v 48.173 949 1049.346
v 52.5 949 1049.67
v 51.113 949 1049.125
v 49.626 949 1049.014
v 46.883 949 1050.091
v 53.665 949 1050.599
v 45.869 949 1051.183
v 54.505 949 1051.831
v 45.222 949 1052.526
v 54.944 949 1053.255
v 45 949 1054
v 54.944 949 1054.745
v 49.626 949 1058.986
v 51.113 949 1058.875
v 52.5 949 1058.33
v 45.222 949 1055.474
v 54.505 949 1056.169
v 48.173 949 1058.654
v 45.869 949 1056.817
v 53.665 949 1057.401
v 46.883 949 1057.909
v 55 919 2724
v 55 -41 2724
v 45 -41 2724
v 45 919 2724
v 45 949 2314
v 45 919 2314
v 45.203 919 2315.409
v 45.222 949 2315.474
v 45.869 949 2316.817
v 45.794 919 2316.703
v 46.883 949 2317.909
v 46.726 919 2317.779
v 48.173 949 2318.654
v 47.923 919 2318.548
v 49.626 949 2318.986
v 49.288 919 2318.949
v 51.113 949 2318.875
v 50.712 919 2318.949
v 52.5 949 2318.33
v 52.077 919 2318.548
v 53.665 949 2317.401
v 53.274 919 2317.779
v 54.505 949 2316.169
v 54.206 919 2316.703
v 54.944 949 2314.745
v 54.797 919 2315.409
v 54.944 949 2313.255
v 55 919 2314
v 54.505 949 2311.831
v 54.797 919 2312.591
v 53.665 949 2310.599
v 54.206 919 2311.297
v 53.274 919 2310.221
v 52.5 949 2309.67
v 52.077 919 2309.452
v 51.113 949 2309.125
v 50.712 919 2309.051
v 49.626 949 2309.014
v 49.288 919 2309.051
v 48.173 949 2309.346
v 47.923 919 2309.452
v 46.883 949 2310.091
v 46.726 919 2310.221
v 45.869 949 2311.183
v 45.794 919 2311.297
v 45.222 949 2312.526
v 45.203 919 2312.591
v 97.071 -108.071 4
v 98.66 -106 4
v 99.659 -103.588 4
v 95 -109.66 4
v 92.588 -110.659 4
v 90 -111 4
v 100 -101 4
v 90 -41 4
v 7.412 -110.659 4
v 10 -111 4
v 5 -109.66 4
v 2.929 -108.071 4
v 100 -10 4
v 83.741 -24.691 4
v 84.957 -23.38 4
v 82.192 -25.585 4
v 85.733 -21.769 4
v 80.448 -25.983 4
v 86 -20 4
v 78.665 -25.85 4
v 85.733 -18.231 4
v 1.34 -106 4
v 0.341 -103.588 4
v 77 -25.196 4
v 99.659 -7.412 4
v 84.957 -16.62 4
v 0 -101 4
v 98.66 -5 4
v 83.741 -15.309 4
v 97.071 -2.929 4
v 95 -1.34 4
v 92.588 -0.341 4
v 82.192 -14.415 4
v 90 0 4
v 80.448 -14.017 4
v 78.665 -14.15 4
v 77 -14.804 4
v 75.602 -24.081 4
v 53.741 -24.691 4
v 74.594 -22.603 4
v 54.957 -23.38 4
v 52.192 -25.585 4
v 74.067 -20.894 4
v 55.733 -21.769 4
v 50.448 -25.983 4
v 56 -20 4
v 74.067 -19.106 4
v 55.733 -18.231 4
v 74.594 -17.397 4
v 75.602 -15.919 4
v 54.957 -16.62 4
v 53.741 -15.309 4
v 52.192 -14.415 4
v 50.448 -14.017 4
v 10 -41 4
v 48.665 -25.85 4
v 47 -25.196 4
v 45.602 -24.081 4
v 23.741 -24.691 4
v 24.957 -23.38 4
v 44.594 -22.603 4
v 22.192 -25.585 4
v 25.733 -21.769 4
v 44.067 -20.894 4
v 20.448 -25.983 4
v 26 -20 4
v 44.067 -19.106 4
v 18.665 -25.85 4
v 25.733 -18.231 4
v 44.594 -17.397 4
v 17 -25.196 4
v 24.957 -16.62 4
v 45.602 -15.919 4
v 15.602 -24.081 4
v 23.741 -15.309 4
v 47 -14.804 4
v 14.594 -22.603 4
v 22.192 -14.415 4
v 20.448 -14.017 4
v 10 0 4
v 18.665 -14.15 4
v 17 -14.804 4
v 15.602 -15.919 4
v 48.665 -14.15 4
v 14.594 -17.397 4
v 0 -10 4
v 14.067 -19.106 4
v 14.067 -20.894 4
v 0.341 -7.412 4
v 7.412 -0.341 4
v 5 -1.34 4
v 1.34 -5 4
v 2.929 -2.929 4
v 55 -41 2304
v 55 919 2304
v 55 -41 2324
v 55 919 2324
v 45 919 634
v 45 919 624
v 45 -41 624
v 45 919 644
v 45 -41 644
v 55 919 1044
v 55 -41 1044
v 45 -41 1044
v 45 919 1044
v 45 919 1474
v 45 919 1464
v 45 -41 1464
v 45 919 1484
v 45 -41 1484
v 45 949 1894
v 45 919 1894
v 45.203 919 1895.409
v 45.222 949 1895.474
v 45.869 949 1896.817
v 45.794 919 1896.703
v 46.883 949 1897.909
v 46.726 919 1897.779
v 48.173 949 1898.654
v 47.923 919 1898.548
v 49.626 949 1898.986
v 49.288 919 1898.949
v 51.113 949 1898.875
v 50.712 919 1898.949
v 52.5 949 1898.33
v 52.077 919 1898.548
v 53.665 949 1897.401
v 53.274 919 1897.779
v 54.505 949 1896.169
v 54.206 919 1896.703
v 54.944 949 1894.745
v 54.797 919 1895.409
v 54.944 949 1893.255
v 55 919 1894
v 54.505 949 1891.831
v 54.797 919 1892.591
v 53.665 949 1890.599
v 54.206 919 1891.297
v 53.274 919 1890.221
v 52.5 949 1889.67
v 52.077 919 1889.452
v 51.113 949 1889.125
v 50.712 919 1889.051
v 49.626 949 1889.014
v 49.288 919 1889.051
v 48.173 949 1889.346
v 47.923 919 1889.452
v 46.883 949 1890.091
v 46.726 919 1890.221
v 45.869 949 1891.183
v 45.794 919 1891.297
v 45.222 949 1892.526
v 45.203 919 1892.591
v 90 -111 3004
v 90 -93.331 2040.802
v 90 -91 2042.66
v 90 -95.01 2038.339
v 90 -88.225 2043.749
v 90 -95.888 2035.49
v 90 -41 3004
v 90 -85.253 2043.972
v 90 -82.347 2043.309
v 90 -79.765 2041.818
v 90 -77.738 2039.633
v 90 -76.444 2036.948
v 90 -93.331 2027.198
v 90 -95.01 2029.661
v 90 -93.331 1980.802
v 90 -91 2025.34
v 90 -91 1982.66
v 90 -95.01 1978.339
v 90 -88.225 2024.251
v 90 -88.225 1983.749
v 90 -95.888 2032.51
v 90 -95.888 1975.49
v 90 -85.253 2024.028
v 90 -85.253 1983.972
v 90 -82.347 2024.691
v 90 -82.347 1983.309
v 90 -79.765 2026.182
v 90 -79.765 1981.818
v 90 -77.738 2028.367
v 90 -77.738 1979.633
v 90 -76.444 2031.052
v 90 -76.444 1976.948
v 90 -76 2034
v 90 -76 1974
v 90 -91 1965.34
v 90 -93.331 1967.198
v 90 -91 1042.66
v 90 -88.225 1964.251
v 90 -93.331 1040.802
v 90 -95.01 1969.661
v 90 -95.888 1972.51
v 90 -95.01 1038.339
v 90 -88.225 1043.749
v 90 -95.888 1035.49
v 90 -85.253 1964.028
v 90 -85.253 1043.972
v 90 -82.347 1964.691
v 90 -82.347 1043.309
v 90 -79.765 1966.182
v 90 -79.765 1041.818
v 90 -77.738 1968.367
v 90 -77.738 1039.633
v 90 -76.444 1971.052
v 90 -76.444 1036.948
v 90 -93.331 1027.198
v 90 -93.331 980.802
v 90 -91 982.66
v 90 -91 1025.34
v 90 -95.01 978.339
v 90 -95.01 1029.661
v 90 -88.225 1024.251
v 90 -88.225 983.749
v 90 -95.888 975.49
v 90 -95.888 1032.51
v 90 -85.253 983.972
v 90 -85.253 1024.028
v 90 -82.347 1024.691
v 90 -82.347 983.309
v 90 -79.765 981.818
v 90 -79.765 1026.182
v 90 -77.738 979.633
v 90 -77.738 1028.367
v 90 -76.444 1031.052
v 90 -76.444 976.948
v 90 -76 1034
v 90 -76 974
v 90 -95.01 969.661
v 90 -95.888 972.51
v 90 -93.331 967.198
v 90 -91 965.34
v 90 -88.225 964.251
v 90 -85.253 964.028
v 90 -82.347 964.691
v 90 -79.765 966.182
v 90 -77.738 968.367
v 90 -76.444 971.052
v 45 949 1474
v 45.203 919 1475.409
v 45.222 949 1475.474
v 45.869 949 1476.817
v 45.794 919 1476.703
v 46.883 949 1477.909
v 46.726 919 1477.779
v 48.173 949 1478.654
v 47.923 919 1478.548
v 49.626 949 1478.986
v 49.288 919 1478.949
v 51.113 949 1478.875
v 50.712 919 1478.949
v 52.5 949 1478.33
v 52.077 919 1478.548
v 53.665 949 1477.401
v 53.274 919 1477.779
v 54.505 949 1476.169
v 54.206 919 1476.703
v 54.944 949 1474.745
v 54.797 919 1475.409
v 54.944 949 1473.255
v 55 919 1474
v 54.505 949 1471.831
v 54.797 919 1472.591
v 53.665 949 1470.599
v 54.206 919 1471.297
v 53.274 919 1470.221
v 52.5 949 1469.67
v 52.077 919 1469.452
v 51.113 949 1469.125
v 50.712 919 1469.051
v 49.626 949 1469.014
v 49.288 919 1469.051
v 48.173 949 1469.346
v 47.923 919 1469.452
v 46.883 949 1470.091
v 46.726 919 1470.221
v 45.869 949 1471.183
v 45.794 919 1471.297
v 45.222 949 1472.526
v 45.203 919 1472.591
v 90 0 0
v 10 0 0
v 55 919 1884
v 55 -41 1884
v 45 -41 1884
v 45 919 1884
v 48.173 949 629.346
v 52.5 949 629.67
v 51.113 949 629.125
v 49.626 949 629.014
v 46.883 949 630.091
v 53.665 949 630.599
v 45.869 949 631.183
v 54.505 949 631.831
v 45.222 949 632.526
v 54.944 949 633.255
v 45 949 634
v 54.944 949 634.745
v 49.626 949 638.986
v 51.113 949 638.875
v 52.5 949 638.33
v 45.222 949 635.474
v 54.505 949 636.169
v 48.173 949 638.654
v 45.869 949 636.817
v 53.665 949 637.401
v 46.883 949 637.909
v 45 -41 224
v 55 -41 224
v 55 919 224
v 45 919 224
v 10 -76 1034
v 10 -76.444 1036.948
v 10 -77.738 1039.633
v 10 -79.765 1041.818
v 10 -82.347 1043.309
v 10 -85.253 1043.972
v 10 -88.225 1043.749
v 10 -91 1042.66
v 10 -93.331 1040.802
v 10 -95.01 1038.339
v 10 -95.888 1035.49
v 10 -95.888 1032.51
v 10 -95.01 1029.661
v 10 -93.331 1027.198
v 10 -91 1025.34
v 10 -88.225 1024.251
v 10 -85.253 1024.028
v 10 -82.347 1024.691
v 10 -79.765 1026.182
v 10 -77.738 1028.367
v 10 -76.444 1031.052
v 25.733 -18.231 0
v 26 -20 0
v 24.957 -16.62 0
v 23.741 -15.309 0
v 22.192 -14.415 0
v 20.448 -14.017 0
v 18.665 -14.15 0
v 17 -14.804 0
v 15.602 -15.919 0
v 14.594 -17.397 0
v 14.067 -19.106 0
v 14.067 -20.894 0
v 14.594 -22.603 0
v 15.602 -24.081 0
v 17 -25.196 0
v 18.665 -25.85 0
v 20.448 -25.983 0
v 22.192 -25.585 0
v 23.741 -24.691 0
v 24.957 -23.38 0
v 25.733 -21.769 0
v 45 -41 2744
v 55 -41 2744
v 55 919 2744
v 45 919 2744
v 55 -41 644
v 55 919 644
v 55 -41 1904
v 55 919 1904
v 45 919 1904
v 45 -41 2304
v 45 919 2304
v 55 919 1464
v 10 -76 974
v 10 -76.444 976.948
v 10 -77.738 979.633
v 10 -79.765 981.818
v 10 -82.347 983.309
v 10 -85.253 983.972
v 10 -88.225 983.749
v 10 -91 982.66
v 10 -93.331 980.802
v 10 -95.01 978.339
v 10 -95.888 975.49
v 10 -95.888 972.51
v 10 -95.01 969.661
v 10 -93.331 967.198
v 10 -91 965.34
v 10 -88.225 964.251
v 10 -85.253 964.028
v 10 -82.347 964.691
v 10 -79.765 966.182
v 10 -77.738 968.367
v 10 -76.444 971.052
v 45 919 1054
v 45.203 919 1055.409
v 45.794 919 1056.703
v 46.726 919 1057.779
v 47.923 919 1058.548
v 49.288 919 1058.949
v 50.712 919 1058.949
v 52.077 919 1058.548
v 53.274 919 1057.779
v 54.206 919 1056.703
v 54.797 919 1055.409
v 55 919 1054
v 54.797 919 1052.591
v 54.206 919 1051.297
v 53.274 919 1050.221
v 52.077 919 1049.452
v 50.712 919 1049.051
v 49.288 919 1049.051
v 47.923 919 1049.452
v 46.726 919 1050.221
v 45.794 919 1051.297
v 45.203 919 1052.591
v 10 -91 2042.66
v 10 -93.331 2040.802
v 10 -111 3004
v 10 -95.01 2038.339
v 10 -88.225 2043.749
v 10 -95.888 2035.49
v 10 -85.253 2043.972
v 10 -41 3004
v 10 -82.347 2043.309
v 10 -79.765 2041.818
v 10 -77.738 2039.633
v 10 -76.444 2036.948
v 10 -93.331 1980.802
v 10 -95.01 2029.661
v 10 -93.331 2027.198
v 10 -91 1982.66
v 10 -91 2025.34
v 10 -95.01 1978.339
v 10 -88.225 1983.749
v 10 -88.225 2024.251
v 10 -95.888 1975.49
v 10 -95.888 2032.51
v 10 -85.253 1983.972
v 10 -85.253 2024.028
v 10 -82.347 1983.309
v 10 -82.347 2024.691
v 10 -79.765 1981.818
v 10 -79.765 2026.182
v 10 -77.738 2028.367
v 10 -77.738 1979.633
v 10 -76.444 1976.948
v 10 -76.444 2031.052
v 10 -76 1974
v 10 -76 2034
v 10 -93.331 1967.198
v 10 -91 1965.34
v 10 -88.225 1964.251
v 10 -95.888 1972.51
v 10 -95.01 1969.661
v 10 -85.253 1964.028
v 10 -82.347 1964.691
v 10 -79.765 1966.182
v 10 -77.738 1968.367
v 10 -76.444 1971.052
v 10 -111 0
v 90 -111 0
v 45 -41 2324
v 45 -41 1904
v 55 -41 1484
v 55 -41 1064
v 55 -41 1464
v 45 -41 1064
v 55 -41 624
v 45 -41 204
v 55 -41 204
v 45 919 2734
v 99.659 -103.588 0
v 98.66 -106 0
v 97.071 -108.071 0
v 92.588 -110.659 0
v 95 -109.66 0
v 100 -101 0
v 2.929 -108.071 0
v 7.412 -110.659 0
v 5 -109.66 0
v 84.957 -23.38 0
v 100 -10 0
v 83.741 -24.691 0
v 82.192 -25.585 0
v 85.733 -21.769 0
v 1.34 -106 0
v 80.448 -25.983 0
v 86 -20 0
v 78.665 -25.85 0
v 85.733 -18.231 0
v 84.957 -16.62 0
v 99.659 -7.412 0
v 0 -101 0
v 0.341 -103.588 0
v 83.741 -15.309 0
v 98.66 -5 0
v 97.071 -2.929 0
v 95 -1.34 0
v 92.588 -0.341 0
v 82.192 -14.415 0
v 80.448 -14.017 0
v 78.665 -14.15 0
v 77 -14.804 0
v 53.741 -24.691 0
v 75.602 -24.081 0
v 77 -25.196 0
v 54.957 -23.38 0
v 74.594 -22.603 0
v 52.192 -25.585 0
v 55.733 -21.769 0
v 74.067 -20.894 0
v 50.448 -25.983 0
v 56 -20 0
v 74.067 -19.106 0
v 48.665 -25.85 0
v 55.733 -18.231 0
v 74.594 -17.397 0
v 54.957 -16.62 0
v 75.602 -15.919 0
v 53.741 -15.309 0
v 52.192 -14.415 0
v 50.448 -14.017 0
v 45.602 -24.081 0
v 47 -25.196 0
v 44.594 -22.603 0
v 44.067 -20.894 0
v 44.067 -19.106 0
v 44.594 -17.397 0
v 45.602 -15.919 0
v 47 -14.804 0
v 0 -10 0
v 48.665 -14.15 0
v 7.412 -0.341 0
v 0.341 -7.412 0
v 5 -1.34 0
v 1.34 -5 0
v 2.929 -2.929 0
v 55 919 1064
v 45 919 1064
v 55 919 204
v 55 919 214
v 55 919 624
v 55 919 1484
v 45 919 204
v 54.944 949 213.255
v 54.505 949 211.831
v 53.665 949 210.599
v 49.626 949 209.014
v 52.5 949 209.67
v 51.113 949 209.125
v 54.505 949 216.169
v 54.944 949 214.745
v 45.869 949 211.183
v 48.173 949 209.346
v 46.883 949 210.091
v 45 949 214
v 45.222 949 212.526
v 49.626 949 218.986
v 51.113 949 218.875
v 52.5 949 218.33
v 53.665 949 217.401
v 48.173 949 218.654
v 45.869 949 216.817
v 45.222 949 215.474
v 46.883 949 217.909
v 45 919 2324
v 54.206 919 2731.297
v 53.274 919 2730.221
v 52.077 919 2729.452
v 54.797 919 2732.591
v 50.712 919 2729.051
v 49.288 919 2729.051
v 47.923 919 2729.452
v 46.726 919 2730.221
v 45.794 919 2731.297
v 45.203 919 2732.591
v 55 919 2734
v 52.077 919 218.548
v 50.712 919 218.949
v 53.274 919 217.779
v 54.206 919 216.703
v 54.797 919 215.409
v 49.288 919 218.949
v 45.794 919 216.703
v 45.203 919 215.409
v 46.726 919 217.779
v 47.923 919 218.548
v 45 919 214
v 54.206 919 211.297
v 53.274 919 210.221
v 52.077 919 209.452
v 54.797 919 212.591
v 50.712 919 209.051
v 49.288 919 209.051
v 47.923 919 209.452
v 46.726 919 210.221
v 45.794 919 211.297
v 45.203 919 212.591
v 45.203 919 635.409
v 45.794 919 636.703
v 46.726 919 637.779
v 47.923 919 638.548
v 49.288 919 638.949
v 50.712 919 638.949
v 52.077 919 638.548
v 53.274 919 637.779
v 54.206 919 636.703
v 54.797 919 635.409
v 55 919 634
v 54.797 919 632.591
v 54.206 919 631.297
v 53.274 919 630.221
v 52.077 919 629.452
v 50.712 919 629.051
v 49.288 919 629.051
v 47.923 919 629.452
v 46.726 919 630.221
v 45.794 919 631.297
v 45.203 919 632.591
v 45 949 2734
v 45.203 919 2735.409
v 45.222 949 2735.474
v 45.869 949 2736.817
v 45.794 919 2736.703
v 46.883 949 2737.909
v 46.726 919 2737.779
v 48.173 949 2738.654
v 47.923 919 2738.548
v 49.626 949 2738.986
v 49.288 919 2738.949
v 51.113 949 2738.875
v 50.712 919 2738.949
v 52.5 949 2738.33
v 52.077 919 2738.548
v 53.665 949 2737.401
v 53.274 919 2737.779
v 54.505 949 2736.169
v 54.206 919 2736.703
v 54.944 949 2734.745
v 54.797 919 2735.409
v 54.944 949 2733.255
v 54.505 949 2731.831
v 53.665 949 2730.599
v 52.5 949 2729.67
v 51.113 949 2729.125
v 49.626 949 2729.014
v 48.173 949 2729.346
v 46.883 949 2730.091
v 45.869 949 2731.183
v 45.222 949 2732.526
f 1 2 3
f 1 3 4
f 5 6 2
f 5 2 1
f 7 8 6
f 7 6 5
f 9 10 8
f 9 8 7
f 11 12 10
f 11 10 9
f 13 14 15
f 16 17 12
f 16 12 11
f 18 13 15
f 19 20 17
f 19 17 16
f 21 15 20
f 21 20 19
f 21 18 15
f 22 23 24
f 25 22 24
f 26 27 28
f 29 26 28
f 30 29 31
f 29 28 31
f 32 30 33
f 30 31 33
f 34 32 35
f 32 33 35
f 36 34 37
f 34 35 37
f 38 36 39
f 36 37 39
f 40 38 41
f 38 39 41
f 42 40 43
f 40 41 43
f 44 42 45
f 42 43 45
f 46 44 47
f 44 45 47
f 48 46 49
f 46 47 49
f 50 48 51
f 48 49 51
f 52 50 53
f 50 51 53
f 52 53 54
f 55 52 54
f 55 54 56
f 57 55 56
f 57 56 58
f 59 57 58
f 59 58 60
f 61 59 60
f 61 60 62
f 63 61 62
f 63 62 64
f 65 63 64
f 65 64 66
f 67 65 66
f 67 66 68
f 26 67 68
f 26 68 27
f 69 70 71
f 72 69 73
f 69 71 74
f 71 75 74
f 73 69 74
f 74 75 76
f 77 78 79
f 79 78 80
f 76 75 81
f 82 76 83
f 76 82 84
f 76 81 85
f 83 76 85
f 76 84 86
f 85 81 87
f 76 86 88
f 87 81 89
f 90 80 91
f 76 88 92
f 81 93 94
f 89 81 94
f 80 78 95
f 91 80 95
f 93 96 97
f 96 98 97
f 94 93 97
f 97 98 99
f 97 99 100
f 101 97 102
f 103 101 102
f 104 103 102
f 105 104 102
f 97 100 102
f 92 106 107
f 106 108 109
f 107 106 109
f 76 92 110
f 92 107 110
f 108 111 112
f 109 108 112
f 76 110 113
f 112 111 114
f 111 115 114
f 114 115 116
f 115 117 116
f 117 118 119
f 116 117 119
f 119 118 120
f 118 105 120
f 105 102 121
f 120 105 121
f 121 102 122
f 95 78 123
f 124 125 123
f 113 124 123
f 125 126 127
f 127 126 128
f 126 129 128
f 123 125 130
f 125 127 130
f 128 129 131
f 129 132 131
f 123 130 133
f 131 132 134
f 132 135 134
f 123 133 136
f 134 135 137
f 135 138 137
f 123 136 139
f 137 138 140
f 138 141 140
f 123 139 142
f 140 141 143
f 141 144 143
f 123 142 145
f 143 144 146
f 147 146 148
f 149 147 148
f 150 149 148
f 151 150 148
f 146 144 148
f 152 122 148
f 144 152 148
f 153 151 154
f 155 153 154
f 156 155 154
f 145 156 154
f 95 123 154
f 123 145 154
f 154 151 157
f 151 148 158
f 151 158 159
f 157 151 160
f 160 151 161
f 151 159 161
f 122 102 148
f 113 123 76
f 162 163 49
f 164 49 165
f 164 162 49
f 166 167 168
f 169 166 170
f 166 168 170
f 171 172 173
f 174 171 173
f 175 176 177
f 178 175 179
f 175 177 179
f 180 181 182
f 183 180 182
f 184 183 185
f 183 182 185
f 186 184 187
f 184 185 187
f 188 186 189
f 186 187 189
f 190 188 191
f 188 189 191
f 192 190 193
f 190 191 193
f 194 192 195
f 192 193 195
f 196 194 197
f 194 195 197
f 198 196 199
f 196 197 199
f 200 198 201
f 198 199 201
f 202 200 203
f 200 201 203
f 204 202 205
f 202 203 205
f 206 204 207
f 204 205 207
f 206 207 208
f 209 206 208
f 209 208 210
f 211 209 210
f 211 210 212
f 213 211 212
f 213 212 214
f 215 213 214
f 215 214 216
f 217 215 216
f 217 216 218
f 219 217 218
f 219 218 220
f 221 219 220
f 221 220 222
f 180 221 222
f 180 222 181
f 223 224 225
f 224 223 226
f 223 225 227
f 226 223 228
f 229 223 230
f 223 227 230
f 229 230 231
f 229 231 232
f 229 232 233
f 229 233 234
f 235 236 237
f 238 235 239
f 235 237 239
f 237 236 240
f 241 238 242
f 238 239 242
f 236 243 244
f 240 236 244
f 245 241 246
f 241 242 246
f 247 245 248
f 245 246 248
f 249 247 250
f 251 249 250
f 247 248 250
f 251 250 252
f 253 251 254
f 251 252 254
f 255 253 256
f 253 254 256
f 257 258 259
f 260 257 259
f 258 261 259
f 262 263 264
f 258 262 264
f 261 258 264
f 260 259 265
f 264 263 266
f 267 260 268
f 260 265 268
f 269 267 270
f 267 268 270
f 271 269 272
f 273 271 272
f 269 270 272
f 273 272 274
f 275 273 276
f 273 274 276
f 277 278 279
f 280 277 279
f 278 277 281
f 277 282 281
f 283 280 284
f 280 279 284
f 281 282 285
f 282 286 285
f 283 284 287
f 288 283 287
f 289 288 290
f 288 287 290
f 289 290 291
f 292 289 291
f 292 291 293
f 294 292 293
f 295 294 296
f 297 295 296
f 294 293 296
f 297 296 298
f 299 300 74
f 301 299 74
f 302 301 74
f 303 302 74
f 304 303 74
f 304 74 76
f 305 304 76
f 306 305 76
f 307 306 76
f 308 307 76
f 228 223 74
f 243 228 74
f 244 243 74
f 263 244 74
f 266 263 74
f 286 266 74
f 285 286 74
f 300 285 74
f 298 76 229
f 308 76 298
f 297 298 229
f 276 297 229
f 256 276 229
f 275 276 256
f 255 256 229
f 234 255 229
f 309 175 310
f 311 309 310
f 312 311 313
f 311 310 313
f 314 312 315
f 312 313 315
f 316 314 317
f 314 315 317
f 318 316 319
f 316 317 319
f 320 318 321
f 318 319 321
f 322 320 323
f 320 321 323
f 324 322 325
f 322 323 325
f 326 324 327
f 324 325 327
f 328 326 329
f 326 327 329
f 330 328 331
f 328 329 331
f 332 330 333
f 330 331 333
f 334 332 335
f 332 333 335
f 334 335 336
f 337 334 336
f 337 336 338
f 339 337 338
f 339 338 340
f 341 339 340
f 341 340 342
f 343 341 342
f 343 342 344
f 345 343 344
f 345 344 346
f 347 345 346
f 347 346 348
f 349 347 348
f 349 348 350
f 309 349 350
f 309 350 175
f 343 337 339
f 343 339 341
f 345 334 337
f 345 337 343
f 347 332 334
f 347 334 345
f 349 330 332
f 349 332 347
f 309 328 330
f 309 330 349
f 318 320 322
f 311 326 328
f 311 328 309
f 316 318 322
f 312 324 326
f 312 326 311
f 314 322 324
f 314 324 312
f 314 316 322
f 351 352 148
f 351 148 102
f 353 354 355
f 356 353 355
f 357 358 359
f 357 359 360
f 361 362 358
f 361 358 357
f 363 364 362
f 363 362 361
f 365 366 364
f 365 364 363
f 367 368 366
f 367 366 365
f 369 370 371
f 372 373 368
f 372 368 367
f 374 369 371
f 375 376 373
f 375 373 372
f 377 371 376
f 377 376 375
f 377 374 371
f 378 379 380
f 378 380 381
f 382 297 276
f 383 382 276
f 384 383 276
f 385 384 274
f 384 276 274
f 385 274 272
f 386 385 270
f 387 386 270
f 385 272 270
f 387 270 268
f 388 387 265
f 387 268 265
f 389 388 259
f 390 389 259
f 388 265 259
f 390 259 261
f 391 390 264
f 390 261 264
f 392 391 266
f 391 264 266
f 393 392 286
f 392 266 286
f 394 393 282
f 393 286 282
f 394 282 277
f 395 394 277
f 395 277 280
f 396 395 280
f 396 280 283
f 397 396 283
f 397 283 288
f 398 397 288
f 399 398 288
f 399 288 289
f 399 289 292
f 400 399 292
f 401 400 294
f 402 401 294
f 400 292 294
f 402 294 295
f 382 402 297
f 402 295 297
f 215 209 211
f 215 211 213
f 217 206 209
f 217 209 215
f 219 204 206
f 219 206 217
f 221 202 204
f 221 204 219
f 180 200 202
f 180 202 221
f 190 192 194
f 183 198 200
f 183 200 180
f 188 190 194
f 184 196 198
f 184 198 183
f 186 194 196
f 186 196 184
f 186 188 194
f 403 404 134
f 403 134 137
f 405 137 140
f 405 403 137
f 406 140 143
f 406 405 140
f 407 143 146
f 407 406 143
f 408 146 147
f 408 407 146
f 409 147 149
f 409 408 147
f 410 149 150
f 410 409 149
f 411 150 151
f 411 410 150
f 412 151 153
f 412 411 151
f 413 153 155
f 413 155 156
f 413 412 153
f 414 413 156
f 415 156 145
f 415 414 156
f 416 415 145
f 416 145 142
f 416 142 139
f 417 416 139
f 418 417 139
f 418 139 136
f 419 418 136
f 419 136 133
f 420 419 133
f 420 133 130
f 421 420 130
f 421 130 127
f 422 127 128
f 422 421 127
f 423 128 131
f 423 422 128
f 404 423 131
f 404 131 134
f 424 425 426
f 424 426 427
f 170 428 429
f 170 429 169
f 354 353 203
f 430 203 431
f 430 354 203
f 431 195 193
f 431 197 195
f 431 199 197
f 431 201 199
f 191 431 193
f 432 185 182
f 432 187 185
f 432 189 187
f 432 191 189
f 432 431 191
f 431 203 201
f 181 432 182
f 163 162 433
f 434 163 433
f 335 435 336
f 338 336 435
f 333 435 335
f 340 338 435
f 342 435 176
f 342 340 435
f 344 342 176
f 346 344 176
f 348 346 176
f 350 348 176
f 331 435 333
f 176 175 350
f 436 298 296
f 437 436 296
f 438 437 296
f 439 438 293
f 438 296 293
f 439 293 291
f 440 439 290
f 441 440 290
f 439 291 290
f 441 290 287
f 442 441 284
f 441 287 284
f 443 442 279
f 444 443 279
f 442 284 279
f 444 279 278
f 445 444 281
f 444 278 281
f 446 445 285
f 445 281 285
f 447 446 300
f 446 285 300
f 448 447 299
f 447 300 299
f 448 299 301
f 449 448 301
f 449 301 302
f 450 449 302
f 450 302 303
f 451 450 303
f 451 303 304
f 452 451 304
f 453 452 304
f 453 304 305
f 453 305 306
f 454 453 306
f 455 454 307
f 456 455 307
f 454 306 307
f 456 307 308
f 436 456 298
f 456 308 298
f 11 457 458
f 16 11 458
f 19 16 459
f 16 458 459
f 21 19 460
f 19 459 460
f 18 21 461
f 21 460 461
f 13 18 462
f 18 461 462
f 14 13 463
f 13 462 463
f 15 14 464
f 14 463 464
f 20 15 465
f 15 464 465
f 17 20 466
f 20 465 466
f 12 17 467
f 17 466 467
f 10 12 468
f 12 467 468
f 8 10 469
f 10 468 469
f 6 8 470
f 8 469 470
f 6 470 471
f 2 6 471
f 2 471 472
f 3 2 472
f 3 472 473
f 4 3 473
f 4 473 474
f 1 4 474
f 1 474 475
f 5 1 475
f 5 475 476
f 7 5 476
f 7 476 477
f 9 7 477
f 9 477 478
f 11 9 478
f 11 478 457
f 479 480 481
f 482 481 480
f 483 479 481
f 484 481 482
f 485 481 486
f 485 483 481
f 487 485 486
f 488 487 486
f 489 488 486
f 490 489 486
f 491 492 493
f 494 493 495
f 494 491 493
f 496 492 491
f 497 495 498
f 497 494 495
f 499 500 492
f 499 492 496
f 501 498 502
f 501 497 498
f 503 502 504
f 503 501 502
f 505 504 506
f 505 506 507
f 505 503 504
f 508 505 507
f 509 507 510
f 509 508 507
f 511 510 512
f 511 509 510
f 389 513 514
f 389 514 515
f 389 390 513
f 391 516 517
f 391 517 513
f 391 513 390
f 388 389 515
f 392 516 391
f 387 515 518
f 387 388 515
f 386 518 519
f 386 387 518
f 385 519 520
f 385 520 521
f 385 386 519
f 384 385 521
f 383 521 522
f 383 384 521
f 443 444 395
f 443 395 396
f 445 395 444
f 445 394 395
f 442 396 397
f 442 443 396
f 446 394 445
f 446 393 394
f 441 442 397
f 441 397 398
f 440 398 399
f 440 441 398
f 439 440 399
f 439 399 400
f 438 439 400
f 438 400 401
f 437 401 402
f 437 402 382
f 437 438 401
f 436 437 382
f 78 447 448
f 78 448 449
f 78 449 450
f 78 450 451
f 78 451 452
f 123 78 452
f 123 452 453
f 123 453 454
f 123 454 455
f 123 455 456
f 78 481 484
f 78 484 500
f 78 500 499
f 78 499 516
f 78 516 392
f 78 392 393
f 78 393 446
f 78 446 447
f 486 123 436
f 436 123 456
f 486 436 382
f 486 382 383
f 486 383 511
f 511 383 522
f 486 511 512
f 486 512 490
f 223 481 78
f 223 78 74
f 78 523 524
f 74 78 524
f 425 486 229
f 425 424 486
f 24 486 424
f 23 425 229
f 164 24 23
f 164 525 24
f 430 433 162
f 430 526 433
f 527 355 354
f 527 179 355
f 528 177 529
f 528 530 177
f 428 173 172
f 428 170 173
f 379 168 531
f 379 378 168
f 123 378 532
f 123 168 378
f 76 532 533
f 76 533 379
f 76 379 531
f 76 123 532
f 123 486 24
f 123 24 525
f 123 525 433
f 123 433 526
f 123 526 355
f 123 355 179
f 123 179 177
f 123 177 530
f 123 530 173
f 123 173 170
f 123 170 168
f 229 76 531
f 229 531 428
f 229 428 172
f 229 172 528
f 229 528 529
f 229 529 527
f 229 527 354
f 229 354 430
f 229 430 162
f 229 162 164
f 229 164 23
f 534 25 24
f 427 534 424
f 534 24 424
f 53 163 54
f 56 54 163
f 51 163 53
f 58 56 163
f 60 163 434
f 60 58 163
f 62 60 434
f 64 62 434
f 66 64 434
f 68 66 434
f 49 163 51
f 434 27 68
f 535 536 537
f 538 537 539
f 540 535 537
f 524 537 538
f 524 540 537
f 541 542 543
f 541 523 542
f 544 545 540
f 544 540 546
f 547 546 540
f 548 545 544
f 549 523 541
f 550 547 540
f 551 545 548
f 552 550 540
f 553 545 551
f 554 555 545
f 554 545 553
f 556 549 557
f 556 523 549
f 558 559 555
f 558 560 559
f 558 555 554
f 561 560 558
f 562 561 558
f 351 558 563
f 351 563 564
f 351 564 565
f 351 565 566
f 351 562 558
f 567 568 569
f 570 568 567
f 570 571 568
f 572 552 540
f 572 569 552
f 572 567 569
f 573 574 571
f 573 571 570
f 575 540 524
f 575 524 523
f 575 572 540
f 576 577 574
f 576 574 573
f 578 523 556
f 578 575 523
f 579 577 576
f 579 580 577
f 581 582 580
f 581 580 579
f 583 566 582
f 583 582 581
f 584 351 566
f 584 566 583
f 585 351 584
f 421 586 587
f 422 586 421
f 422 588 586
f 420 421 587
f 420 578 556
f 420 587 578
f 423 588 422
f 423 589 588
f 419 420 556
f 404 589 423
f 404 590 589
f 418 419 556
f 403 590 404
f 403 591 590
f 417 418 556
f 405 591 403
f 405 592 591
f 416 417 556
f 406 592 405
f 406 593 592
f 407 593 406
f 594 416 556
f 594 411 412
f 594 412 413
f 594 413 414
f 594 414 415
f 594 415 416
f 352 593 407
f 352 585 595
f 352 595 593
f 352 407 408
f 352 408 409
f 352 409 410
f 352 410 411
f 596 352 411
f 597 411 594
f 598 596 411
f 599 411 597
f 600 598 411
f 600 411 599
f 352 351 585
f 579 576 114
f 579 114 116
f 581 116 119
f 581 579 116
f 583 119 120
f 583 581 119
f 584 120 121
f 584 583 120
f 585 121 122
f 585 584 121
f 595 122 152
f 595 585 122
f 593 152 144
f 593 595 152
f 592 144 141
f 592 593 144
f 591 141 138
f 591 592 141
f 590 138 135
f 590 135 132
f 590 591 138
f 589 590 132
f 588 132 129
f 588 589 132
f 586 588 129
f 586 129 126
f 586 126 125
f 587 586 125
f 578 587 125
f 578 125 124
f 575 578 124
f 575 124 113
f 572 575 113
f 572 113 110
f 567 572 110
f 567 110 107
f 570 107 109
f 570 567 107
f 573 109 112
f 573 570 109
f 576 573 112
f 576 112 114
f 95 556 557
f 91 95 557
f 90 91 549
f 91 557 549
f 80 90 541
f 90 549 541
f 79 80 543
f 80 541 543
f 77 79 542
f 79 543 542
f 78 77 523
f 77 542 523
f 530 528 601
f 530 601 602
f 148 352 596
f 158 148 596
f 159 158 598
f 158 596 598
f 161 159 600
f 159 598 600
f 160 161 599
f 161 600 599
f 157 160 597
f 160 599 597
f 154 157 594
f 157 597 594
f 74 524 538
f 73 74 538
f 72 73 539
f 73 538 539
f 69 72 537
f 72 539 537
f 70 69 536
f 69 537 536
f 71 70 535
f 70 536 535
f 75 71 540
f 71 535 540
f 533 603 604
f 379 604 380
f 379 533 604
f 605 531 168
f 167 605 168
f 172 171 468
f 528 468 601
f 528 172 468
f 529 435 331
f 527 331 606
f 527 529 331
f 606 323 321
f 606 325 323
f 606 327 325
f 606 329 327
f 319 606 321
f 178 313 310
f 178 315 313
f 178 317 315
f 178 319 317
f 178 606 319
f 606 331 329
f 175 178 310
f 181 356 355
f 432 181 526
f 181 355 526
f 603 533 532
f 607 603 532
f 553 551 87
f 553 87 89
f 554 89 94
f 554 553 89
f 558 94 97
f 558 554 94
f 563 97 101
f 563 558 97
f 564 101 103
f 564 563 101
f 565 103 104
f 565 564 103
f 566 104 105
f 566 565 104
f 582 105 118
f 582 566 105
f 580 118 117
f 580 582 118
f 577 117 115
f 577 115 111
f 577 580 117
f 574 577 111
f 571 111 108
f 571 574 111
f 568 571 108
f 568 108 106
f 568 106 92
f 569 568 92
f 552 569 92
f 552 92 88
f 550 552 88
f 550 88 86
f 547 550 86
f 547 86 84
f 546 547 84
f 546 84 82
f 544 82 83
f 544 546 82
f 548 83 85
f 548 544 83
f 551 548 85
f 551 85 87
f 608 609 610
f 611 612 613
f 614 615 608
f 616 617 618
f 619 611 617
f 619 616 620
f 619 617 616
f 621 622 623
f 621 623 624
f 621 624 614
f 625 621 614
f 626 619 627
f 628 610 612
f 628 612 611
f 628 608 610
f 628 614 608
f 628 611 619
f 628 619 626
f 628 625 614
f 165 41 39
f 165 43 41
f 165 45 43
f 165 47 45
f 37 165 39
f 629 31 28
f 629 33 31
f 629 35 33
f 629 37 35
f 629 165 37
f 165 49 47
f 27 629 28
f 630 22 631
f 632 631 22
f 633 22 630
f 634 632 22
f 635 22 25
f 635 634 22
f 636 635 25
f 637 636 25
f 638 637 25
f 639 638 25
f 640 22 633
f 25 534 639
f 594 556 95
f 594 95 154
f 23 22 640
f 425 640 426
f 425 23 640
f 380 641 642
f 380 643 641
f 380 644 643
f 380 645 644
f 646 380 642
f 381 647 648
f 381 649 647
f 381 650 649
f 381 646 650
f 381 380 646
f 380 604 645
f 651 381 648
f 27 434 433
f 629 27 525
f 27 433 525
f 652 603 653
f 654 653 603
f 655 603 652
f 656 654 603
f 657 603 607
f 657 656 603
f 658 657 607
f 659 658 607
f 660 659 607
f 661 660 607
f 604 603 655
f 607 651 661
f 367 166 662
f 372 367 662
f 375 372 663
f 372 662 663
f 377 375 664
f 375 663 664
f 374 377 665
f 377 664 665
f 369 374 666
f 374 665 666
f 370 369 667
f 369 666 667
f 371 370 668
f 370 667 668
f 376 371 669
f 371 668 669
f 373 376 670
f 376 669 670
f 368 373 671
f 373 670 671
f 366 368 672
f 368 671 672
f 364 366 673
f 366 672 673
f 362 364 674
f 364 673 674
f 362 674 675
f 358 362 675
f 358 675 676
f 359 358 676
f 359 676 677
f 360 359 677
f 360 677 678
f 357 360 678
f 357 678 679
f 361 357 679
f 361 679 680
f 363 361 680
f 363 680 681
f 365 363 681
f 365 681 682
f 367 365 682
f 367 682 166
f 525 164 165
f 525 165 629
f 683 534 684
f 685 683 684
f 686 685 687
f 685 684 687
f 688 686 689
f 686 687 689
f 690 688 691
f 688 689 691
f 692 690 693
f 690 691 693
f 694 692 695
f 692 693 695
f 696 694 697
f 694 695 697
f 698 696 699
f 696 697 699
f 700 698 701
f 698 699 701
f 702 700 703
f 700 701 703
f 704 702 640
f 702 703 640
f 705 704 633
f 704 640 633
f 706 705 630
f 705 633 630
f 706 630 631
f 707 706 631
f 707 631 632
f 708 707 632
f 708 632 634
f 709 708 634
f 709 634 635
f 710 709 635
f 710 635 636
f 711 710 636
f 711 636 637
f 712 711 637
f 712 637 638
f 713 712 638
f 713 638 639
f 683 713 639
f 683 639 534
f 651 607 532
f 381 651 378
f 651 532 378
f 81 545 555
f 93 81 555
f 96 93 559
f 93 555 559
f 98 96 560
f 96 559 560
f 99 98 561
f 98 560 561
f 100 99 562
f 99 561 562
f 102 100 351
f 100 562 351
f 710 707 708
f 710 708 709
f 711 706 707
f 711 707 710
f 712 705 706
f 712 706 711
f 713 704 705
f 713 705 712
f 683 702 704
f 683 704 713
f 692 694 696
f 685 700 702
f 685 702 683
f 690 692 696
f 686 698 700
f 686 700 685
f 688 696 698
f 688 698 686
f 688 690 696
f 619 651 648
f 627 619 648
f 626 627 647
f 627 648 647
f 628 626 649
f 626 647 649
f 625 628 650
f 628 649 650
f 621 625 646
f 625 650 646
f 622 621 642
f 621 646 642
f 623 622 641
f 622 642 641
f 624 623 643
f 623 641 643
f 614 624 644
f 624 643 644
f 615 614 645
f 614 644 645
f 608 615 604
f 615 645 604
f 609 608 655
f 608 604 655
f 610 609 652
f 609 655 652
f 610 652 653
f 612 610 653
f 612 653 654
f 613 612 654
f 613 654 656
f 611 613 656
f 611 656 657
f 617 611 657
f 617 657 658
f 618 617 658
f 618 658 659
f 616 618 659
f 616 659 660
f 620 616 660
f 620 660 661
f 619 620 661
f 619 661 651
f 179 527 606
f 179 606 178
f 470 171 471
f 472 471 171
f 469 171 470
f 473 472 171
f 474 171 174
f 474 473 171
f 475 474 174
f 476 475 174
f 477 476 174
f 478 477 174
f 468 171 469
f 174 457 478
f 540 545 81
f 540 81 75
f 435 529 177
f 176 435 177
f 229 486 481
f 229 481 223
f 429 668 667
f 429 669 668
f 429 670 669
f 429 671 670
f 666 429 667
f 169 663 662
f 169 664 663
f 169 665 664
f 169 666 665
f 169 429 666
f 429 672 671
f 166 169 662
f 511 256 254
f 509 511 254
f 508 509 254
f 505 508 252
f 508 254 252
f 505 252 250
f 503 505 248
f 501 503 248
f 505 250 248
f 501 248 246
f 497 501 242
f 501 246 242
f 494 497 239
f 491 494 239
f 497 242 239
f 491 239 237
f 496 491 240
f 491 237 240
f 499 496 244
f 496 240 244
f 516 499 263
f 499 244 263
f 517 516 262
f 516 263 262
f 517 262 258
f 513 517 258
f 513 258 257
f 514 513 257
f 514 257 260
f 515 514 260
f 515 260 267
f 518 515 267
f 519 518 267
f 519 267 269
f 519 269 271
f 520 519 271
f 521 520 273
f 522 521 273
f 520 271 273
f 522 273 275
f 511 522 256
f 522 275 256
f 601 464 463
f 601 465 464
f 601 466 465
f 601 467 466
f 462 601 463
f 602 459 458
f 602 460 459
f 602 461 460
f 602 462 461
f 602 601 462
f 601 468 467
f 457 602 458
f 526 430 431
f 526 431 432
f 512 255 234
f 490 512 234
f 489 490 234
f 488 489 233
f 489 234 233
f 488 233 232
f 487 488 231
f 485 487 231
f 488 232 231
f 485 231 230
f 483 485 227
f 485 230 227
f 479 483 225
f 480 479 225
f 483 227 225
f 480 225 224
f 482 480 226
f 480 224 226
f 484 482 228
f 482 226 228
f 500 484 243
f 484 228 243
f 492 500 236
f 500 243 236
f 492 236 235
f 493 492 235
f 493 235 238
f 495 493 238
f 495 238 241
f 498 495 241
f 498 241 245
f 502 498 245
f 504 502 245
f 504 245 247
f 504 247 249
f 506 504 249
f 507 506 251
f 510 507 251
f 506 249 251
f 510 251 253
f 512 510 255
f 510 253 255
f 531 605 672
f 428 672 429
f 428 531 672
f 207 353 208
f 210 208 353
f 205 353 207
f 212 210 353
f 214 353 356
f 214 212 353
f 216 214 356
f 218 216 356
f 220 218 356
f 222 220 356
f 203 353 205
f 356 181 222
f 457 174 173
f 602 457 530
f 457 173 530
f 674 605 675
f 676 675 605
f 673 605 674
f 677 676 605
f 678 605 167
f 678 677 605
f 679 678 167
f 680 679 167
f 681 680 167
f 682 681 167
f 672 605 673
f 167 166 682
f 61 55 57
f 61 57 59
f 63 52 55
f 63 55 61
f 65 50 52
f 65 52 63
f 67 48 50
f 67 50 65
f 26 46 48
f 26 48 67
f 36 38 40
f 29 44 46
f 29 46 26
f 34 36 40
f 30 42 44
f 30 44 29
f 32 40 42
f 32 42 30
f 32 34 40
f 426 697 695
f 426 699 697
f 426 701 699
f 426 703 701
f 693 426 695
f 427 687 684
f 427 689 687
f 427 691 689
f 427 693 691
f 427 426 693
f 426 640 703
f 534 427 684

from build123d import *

# Parameters (mm, degrees)
SKETCH_R     = 6
PAD_DEPTH    = 4
SKETCH001_W  = 80
SKETCH001_H  = 70
PAD001_DEPTH = 3000
SKETCH002_R  = 10
POCKET_DEPTH = 80
SKETCH004_W  = 10
SKETCH004_H  = 20
PAD002_DEPTH = 960
SKETCH005_R  = 5
PAD003_DEPTH = 30


with BuildPart() as part:
    # Sketch → Pad (new body)
    with BuildSketch(Plane.XY):
        with BuildLine():
            Line((10, 0), (90, 0))
            ThreePointArc((100, -10), (97.071068, -2.928932), (90, 0))
            Line((100, -10), (100, -101))
            ThreePointArc((90, -111), (97.071068, -108.071068), (100, -101))
            Line((90, -111), (10, -111))
            ThreePointArc((0, -101), (2.928932, -108.071068), (10, -111))
            Line((0, -101), (0, -10))
            ThreePointArc((10, 0), (2.928932, -2.928932), (0, -10))
        make_face()
        with Locations((20, -20)):
            Circle(SKETCH_R, mode=Mode.SUBTRACT)
        with Locations((50, -20)):
            Circle(SKETCH_R, mode=Mode.SUBTRACT)
        with Locations((80, -20)):
            Circle(SKETCH_R, mode=Mode.SUBTRACT)
    extrude(amount=PAD_DEPTH)

    # Sketch001 (on Face13 of Pad) → Pad001 (join)
    with BuildSketch(Plane.XY.offset(4)):
        with Locations((50, -76)):
            Rectangle(SKETCH001_W, SKETCH001_H)
    extrude(amount=PAD001_DEPTH)

    # Sketch002 (on Face14 of Pad001) → Pocket (cut)
    with BuildSketch(Plane.YZ.offset(90)):
        with Locations((-86, 1034)):
            Circle(SKETCH002_R)
        with Locations((-86, 974)):
            Circle(SKETCH002_R)
        with Locations((-86, 2034)):
            Circle(SKETCH002_R)
        with Locations((-86, 1974)):
            Circle(SKETCH002_R)
    extrude(amount=-POCKET_DEPTH, mode=Mode.SUBTRACT)

    # Sketch004 (on Face15 of Pocket) → Pad002 (join)
    with BuildSketch(Plane(origin=(0, -41, 0), x_dir=(-1, 0, 0), z_dir=(0, 1, 0))):
        with Locations((-50, 214)):
            Rectangle(SKETCH004_W, SKETCH004_H)
        with Locations((-50, 634)):
            Rectangle(SKETCH004_W, SKETCH004_H)
        with Locations((-50, 1054)):
            Rectangle(SKETCH004_W, SKETCH004_H)
        with Locations((-50, 1474)):
            Rectangle(SKETCH004_W, SKETCH004_H)
        with Locations((-50, 1894)):
            Rectangle(SKETCH004_W, SKETCH004_H)
        with Locations((-50, 2314)):
            Rectangle(SKETCH004_W, SKETCH004_H)
        with Locations((-50, 2734)):
            Rectangle(SKETCH004_W, SKETCH004_H)
    extrude(amount=PAD002_DEPTH)

    # Sketch005 (on Face52 of Pad002) → Pad003 (join)
    with BuildSketch(Plane(origin=(0, 919, 0), x_dir=(-1, 0, 0), z_dir=(0, 1, 0))):
        with Locations((-50, 1474)):
            Circle(SKETCH005_R)
        with Locations((-50, 1054)):
            Circle(SKETCH005_R)
        with Locations((-50, 214)):
            Circle(SKETCH005_R)
        with Locations((-50, 634)):
            Circle(SKETCH005_R)
        with Locations((-50, 1894)):
            Circle(SKETCH005_R)
        with Locations((-50, 2314)):
            Circle(SKETCH005_R)
        with Locations((-50, 2734)):
            Circle(SKETCH005_R)
    extrude(amount=PAD003_DEPTH)


solid = part.part
